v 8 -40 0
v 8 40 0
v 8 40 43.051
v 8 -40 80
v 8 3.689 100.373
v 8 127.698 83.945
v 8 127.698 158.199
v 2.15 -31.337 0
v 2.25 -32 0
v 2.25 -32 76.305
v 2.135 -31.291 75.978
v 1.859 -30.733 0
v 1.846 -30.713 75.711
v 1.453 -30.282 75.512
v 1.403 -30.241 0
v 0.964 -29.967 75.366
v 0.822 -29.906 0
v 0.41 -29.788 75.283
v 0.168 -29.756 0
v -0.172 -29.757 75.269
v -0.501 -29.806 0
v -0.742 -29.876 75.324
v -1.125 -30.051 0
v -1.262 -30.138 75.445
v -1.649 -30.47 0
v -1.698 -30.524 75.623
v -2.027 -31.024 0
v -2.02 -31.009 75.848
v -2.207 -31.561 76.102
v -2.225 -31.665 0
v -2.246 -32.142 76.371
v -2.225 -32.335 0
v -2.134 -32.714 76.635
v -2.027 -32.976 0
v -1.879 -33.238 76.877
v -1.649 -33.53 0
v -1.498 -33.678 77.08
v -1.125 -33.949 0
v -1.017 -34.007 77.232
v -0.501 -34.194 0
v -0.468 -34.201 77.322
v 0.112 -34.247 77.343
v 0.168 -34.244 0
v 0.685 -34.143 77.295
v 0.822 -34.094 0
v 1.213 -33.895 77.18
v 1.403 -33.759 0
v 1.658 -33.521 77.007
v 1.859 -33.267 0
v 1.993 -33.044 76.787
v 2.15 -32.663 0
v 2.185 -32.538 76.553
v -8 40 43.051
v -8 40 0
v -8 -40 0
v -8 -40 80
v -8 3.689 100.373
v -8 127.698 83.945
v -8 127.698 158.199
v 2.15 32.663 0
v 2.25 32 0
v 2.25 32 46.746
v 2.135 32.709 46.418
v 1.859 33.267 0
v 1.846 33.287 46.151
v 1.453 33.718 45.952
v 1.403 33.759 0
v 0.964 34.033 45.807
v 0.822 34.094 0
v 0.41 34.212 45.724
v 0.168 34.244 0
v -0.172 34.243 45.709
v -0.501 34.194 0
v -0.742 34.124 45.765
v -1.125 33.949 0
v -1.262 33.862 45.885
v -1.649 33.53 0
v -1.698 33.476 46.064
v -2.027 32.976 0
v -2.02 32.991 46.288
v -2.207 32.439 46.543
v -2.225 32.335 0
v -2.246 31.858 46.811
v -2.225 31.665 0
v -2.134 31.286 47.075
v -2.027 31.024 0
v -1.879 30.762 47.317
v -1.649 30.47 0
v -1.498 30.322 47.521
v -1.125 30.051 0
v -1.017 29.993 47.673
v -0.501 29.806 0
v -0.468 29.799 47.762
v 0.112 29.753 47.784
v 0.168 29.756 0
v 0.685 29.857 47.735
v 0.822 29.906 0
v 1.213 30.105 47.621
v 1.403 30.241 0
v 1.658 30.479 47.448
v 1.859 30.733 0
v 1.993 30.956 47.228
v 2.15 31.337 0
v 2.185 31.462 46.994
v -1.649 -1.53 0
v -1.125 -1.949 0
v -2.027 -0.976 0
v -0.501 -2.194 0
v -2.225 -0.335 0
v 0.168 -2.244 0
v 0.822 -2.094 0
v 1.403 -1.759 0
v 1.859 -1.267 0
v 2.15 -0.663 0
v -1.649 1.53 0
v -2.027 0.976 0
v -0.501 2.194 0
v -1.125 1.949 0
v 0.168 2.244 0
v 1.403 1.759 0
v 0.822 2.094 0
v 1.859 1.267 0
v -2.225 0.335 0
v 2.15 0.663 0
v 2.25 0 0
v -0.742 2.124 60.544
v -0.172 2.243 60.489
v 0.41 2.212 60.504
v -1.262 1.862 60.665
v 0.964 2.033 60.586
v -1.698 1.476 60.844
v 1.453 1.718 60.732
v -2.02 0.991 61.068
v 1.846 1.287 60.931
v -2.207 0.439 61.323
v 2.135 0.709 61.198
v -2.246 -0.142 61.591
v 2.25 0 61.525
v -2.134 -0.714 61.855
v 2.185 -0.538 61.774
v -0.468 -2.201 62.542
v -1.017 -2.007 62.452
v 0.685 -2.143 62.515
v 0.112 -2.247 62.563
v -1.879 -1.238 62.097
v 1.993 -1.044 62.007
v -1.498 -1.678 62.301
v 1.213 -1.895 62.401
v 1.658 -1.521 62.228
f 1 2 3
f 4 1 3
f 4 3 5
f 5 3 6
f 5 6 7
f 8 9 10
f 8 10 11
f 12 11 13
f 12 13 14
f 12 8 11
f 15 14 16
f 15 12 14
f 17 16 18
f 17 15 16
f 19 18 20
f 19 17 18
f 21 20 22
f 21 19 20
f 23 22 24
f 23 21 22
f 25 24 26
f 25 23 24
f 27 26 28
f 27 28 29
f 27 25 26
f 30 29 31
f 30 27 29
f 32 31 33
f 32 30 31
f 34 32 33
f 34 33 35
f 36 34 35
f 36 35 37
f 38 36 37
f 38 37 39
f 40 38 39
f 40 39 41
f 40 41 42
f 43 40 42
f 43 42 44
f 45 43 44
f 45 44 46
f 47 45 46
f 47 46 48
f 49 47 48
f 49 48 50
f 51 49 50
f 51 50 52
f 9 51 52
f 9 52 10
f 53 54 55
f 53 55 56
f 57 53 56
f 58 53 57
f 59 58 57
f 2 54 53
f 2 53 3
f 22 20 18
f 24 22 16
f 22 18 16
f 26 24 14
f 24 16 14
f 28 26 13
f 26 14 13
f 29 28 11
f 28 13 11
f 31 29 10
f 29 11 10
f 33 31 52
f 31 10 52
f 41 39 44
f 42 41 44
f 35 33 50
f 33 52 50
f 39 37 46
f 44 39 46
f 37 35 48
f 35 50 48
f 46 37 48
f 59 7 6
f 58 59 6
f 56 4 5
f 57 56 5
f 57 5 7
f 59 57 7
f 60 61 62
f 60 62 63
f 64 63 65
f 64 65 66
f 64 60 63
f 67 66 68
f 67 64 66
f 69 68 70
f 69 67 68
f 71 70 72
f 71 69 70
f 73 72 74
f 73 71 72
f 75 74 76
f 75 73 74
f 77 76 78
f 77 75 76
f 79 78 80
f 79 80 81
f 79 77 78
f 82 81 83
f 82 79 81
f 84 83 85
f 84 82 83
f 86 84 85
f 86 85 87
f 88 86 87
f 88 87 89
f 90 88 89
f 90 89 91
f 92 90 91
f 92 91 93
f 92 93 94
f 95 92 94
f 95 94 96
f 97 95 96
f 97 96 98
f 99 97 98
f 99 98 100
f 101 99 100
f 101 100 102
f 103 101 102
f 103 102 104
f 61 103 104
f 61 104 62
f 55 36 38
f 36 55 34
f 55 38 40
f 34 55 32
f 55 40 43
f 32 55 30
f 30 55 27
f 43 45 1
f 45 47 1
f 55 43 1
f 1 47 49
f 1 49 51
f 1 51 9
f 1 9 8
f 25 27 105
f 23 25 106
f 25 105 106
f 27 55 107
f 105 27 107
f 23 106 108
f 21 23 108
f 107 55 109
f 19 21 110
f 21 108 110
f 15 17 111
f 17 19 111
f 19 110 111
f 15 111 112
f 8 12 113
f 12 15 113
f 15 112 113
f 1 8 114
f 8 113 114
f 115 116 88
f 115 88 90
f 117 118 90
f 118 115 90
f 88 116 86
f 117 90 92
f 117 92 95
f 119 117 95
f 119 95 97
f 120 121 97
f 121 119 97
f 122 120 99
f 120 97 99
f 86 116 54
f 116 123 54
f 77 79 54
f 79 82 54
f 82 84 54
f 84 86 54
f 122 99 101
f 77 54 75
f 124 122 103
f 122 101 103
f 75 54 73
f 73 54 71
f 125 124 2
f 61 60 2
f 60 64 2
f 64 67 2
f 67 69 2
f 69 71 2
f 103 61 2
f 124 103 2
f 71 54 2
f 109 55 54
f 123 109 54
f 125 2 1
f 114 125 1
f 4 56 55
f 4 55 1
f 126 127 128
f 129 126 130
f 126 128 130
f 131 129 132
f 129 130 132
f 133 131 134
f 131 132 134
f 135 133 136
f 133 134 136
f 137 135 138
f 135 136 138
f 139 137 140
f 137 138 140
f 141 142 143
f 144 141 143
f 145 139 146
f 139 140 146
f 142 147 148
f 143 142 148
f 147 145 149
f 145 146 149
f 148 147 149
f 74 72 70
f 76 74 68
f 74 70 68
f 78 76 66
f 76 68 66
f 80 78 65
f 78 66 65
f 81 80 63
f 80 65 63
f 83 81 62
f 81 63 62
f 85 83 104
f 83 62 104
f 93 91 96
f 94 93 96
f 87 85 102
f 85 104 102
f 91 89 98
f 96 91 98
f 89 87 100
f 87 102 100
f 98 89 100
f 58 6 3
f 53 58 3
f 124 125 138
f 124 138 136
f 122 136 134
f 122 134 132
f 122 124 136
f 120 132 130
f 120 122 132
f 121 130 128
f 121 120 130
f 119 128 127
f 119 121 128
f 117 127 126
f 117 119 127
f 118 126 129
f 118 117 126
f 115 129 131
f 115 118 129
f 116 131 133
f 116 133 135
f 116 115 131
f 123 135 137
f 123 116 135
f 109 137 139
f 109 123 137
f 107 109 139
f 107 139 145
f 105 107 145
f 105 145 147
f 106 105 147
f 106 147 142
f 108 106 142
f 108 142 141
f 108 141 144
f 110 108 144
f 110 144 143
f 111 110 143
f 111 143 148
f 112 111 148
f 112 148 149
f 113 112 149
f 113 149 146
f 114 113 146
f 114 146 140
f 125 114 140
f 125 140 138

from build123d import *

# Parameters (mm, degrees)
SKETCH_1_W      = 16
SKETCH_1_H      = 80
SKETCH_1_R      = 2.25
EXTRUDE_1_DEPTH = 80
EXTRUDE_2_DEPTH = 16


with BuildPart() as part:
    # 草图1 → 凸台-拉伸1 (new body)
    with BuildSketch(Plane.XY):
        Rectangle(SKETCH_1_W, SKETCH_1_H)
        with Locations((0, 32)):
            Circle(SKETCH_1_R, mode=Mode.SUBTRACT)
        Circle(SKETCH_1_R, mode=Mode.SUBTRACT)
        with Locations((0, -32)):
            Circle(SKETCH_1_R, mode=Mode.SUBTRACT)
    extrude(amount=EXTRUDE_1_DEPTH)

    # 草图2 → 凸台-拉伸2 (add)
    with BuildSketch(Plane(origin=(8, 0, 0), x_dir=(0, 0, -1), z_dir=(1, 0, 0))):
        Polygon((-80, -40), (-100.37264984, 3.68928857), (-158.198670132, 127.697589274), (-83.944773743, 127.697589274), (-43.050716263, 40), align=None)
    extrude(amount=-EXTRUDE_2_DEPTH)


solid = part.part
